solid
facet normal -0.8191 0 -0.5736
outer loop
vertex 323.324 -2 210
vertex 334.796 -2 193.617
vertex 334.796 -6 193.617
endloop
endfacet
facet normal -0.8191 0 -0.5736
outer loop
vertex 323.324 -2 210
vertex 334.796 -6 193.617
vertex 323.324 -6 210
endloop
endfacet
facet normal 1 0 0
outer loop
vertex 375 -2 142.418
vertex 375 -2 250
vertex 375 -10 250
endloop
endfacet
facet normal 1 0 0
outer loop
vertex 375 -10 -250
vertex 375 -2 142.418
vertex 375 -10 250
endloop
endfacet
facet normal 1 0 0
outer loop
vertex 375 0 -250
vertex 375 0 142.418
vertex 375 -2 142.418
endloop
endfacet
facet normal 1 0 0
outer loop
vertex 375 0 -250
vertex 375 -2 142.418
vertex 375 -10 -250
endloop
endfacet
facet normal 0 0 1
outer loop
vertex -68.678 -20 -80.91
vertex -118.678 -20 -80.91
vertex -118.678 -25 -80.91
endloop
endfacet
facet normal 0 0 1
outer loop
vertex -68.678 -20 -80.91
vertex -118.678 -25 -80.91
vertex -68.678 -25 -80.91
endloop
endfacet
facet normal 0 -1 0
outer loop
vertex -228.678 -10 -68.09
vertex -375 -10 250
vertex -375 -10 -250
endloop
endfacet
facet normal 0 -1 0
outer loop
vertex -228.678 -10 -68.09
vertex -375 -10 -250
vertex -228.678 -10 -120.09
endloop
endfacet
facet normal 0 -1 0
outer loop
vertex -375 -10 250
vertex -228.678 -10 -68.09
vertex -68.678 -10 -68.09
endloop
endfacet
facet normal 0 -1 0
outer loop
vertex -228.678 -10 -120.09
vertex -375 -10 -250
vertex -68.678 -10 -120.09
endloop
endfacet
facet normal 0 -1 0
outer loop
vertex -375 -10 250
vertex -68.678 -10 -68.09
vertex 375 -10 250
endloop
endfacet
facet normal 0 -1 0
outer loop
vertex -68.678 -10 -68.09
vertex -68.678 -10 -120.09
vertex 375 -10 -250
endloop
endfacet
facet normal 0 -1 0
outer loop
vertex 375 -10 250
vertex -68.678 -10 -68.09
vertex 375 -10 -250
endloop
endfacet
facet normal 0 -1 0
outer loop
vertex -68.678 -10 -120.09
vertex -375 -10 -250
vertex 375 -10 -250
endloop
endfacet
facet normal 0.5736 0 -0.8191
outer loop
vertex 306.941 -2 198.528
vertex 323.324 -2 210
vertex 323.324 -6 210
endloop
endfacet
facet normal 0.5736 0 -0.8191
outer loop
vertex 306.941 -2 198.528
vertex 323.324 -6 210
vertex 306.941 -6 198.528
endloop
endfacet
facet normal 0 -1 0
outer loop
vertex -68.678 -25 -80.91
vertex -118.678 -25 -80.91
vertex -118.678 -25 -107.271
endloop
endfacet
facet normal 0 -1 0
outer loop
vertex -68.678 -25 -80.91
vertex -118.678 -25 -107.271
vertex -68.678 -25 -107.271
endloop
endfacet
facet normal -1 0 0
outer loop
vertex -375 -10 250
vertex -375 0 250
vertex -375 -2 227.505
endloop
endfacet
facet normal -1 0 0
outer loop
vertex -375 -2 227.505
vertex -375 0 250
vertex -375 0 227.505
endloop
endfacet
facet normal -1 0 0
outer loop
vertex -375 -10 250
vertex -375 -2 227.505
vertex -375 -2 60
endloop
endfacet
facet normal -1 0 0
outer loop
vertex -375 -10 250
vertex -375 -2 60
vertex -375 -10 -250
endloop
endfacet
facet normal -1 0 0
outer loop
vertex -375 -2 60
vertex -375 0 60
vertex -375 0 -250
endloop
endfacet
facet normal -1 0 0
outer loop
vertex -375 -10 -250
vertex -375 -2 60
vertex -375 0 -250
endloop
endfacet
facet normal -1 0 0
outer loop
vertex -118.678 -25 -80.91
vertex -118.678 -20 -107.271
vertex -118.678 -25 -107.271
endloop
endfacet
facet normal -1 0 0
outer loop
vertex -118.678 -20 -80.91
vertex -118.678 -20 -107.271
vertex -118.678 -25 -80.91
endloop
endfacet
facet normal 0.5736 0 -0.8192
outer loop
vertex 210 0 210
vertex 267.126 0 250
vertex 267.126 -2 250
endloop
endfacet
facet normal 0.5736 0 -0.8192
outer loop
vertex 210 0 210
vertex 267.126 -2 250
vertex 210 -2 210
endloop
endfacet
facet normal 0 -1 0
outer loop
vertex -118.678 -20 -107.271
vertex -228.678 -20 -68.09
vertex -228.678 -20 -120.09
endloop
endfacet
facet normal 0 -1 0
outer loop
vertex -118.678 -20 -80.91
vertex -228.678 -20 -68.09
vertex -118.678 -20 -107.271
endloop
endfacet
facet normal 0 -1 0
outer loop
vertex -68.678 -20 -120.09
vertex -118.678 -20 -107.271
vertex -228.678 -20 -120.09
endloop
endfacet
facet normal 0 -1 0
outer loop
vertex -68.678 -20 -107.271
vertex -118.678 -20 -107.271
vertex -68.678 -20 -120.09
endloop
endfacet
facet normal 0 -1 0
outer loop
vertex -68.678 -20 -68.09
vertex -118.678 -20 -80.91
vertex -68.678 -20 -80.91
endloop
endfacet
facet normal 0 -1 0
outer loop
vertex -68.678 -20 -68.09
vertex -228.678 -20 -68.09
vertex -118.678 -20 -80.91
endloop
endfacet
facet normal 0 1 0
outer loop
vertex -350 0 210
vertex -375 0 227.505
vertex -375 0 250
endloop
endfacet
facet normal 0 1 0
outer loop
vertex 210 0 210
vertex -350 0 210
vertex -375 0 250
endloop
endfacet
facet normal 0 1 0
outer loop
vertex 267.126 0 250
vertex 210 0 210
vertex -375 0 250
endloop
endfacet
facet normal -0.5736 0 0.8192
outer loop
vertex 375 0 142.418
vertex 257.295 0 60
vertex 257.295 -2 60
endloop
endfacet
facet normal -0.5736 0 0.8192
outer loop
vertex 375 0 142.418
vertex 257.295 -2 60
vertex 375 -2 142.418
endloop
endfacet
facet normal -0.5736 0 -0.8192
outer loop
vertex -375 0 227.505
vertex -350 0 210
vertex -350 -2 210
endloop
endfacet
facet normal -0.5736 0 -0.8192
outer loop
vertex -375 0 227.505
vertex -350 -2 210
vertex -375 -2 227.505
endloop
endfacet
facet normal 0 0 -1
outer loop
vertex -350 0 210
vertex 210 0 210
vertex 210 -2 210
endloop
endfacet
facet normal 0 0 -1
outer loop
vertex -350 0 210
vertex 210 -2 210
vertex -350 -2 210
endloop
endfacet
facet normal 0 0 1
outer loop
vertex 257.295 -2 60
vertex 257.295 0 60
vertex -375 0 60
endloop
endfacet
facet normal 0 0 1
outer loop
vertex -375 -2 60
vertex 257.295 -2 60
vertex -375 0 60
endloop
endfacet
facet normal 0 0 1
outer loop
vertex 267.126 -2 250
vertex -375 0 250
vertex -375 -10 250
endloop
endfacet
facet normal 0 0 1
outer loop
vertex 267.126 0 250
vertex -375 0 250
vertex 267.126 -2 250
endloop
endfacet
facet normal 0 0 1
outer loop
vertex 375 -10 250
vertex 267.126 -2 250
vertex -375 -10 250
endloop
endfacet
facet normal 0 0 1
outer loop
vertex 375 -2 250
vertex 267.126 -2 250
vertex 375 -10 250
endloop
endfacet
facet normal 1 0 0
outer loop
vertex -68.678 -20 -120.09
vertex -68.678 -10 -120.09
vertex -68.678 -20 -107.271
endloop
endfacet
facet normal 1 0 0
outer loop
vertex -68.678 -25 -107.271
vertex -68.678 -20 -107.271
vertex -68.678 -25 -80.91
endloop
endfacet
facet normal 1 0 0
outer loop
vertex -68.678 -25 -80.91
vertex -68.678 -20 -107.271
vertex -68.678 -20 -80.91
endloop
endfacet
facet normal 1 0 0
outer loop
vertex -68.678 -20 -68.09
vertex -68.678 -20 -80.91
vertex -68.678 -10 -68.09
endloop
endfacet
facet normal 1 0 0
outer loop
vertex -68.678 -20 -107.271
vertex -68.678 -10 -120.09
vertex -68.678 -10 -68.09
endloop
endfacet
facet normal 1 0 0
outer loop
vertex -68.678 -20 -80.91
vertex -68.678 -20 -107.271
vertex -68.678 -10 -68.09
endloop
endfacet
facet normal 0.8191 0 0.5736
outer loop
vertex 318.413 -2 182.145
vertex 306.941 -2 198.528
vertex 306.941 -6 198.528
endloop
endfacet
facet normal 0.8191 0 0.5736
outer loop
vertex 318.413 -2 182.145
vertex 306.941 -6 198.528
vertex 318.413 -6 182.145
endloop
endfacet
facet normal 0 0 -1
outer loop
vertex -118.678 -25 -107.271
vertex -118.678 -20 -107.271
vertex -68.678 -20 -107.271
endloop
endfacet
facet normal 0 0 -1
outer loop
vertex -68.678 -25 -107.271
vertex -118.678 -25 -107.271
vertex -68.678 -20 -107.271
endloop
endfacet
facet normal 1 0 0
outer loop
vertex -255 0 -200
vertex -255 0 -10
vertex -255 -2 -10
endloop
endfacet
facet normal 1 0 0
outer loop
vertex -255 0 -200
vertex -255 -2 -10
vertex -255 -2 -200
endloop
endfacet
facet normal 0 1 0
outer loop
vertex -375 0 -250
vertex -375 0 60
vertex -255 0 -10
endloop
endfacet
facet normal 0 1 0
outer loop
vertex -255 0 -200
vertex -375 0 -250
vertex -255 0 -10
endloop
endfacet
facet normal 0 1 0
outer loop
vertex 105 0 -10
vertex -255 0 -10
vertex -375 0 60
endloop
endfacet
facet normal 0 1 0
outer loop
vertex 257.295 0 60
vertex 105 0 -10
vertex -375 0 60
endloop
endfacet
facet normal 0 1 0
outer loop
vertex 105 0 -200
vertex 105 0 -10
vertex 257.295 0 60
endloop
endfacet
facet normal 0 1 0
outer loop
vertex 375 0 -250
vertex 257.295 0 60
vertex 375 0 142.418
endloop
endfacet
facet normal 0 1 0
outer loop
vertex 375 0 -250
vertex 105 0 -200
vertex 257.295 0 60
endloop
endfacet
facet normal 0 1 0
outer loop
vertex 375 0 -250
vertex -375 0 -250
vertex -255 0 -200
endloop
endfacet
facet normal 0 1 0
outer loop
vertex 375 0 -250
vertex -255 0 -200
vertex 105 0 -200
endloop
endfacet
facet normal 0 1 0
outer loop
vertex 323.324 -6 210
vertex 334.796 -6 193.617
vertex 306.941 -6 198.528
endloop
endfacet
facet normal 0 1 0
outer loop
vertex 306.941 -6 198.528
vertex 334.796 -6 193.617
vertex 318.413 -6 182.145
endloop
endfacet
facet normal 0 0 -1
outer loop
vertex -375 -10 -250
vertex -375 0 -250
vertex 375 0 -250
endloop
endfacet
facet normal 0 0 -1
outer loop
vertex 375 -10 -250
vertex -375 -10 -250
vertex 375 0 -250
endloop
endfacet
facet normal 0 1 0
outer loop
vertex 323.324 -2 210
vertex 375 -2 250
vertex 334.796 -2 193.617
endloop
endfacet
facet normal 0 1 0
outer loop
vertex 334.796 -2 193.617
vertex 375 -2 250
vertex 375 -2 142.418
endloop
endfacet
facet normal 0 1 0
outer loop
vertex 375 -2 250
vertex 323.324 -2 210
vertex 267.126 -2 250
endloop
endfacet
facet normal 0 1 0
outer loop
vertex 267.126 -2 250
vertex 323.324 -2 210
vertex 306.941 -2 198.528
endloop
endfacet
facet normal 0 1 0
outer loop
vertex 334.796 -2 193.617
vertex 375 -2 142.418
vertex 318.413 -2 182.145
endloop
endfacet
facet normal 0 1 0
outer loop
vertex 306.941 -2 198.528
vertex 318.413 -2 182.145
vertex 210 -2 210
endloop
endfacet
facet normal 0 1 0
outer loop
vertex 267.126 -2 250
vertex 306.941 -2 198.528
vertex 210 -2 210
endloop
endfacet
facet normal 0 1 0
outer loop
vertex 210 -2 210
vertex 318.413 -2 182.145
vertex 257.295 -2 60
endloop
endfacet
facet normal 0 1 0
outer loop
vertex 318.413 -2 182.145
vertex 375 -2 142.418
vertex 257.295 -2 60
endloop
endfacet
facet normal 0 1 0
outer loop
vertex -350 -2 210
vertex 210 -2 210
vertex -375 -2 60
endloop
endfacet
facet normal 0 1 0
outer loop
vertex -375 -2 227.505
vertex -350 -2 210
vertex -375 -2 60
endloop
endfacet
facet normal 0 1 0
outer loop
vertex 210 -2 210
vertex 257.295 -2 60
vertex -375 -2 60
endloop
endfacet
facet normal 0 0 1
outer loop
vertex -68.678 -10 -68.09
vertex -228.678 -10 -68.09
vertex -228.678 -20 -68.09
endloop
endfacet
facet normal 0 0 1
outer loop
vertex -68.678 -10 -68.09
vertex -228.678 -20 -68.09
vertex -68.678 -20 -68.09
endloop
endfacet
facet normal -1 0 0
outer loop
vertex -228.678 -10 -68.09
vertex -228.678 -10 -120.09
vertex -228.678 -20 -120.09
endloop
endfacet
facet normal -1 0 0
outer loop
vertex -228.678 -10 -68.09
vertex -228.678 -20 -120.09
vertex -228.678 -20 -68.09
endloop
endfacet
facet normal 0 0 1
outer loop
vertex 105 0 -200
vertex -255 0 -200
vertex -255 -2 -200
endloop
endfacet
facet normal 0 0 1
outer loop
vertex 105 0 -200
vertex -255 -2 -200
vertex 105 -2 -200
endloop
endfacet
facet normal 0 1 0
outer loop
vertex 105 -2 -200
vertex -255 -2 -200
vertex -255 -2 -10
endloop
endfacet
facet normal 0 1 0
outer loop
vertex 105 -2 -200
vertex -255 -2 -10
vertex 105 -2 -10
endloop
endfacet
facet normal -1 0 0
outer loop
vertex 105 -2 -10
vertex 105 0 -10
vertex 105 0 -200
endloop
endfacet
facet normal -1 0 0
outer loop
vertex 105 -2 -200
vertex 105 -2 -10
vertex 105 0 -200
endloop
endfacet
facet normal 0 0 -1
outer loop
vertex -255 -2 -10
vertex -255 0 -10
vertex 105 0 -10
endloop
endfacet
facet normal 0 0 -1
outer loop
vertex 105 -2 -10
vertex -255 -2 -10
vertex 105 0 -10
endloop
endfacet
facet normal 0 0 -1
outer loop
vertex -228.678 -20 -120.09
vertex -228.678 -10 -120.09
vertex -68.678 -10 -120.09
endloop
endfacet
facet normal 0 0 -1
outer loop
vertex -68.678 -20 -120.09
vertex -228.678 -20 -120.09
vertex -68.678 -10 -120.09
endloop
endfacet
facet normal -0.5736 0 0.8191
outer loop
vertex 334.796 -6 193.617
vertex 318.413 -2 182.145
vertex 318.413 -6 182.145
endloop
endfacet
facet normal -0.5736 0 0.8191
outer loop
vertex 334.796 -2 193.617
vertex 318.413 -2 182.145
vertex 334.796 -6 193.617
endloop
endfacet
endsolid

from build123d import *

# Parameters (mm, degrees)
CROQUIS3_W              = 750
CROQUIS3_H              = 500
SALIENTE_EXTRUIR1_DEPTH = 10
CROQUIS5_W              = 360
CROQUIS5_H              = 190
CORTAR_EXTRUIR2_DEPTH   = 2
CORTAR_EXTRUIR3_DEPTH   = 4
CROQUIS8_W              = 50
CROQUIS8_H              = 26.360948023
SALIENTE_EXTRUIR2_DEPTH = 15
CROQUIS9_W              = 160
CROQUIS9_H              = 52
SALIENTE_EXTRUIR3_DEPTH = 10


with BuildPart() as part:
    # Croquis3 → Saliente-Extruir1 (new body)
    with BuildSketch(Plane(origin=(0, 0, 0), x_dir=(1, 0, 0), z_dir=(0, 1, 0))):
        Rectangle(CROQUIS3_W, CROQUIS3_H)
    extrude(amount=-SALIENTE_EXTRUIR1_DEPTH)

    # Croquis5 → Cortar-Extruir2 (cut)
    with BuildSketch(Plane(origin=(0, 0, 0), x_dir=(1, 0, 0), z_dir=(0, 1, 0))):
        with Locations((-75, 105)):
            Rectangle(CROQUIS5_W, CROQUIS5_H)
        Polygon((-350, -60), (210, -60), (257.294818332, -60), (375, -142.41805549), (375, -250), (267.12592027, -250), (210, -210), (-350, -210), (-375, -227.505188455), (-375, -60), align=None)
    extrude(amount=-CORTAR_EXTRUIR2_DEPTH, mode=Mode.SUBTRACT)

    # Croquis7 → Cortar-Extruir3 (cut)
    with BuildSketch(Plane(origin=(0, -2, 0), x_dir=(1, 0, 0), z_dir=(0, 1, 0))):
        Polygon((318.412529557, -182.145430387), (334.795570442, -193.616959114), (323.324041715, -210), (306.94100083, -198.528471273), align=None)
    extrude(amount=-CORTAR_EXTRUIR3_DEPTH, mode=Mode.SUBTRACT)

    # Croquis8 → Saliente-Extruir2 (add)
    with BuildSketch(Plane.XZ.offset(10)):
        with Locations((-93.677785159, -94.090467316)):
            Rectangle(CROQUIS8_W, CROQUIS8_H)
    extrude(amount=SALIENTE_EXTRUIR2_DEPTH)

    # Croquis9 → Saliente-Extruir3 (add)
    with BuildSketch(Plane.XZ.offset(10)):
        with Locations((-148.677785159, -94.090467317)):
            Rectangle(CROQUIS9_W, CROQUIS9_H)
    extrude(amount=SALIENTE_EXTRUIR3_DEPTH)


solid = part.part
